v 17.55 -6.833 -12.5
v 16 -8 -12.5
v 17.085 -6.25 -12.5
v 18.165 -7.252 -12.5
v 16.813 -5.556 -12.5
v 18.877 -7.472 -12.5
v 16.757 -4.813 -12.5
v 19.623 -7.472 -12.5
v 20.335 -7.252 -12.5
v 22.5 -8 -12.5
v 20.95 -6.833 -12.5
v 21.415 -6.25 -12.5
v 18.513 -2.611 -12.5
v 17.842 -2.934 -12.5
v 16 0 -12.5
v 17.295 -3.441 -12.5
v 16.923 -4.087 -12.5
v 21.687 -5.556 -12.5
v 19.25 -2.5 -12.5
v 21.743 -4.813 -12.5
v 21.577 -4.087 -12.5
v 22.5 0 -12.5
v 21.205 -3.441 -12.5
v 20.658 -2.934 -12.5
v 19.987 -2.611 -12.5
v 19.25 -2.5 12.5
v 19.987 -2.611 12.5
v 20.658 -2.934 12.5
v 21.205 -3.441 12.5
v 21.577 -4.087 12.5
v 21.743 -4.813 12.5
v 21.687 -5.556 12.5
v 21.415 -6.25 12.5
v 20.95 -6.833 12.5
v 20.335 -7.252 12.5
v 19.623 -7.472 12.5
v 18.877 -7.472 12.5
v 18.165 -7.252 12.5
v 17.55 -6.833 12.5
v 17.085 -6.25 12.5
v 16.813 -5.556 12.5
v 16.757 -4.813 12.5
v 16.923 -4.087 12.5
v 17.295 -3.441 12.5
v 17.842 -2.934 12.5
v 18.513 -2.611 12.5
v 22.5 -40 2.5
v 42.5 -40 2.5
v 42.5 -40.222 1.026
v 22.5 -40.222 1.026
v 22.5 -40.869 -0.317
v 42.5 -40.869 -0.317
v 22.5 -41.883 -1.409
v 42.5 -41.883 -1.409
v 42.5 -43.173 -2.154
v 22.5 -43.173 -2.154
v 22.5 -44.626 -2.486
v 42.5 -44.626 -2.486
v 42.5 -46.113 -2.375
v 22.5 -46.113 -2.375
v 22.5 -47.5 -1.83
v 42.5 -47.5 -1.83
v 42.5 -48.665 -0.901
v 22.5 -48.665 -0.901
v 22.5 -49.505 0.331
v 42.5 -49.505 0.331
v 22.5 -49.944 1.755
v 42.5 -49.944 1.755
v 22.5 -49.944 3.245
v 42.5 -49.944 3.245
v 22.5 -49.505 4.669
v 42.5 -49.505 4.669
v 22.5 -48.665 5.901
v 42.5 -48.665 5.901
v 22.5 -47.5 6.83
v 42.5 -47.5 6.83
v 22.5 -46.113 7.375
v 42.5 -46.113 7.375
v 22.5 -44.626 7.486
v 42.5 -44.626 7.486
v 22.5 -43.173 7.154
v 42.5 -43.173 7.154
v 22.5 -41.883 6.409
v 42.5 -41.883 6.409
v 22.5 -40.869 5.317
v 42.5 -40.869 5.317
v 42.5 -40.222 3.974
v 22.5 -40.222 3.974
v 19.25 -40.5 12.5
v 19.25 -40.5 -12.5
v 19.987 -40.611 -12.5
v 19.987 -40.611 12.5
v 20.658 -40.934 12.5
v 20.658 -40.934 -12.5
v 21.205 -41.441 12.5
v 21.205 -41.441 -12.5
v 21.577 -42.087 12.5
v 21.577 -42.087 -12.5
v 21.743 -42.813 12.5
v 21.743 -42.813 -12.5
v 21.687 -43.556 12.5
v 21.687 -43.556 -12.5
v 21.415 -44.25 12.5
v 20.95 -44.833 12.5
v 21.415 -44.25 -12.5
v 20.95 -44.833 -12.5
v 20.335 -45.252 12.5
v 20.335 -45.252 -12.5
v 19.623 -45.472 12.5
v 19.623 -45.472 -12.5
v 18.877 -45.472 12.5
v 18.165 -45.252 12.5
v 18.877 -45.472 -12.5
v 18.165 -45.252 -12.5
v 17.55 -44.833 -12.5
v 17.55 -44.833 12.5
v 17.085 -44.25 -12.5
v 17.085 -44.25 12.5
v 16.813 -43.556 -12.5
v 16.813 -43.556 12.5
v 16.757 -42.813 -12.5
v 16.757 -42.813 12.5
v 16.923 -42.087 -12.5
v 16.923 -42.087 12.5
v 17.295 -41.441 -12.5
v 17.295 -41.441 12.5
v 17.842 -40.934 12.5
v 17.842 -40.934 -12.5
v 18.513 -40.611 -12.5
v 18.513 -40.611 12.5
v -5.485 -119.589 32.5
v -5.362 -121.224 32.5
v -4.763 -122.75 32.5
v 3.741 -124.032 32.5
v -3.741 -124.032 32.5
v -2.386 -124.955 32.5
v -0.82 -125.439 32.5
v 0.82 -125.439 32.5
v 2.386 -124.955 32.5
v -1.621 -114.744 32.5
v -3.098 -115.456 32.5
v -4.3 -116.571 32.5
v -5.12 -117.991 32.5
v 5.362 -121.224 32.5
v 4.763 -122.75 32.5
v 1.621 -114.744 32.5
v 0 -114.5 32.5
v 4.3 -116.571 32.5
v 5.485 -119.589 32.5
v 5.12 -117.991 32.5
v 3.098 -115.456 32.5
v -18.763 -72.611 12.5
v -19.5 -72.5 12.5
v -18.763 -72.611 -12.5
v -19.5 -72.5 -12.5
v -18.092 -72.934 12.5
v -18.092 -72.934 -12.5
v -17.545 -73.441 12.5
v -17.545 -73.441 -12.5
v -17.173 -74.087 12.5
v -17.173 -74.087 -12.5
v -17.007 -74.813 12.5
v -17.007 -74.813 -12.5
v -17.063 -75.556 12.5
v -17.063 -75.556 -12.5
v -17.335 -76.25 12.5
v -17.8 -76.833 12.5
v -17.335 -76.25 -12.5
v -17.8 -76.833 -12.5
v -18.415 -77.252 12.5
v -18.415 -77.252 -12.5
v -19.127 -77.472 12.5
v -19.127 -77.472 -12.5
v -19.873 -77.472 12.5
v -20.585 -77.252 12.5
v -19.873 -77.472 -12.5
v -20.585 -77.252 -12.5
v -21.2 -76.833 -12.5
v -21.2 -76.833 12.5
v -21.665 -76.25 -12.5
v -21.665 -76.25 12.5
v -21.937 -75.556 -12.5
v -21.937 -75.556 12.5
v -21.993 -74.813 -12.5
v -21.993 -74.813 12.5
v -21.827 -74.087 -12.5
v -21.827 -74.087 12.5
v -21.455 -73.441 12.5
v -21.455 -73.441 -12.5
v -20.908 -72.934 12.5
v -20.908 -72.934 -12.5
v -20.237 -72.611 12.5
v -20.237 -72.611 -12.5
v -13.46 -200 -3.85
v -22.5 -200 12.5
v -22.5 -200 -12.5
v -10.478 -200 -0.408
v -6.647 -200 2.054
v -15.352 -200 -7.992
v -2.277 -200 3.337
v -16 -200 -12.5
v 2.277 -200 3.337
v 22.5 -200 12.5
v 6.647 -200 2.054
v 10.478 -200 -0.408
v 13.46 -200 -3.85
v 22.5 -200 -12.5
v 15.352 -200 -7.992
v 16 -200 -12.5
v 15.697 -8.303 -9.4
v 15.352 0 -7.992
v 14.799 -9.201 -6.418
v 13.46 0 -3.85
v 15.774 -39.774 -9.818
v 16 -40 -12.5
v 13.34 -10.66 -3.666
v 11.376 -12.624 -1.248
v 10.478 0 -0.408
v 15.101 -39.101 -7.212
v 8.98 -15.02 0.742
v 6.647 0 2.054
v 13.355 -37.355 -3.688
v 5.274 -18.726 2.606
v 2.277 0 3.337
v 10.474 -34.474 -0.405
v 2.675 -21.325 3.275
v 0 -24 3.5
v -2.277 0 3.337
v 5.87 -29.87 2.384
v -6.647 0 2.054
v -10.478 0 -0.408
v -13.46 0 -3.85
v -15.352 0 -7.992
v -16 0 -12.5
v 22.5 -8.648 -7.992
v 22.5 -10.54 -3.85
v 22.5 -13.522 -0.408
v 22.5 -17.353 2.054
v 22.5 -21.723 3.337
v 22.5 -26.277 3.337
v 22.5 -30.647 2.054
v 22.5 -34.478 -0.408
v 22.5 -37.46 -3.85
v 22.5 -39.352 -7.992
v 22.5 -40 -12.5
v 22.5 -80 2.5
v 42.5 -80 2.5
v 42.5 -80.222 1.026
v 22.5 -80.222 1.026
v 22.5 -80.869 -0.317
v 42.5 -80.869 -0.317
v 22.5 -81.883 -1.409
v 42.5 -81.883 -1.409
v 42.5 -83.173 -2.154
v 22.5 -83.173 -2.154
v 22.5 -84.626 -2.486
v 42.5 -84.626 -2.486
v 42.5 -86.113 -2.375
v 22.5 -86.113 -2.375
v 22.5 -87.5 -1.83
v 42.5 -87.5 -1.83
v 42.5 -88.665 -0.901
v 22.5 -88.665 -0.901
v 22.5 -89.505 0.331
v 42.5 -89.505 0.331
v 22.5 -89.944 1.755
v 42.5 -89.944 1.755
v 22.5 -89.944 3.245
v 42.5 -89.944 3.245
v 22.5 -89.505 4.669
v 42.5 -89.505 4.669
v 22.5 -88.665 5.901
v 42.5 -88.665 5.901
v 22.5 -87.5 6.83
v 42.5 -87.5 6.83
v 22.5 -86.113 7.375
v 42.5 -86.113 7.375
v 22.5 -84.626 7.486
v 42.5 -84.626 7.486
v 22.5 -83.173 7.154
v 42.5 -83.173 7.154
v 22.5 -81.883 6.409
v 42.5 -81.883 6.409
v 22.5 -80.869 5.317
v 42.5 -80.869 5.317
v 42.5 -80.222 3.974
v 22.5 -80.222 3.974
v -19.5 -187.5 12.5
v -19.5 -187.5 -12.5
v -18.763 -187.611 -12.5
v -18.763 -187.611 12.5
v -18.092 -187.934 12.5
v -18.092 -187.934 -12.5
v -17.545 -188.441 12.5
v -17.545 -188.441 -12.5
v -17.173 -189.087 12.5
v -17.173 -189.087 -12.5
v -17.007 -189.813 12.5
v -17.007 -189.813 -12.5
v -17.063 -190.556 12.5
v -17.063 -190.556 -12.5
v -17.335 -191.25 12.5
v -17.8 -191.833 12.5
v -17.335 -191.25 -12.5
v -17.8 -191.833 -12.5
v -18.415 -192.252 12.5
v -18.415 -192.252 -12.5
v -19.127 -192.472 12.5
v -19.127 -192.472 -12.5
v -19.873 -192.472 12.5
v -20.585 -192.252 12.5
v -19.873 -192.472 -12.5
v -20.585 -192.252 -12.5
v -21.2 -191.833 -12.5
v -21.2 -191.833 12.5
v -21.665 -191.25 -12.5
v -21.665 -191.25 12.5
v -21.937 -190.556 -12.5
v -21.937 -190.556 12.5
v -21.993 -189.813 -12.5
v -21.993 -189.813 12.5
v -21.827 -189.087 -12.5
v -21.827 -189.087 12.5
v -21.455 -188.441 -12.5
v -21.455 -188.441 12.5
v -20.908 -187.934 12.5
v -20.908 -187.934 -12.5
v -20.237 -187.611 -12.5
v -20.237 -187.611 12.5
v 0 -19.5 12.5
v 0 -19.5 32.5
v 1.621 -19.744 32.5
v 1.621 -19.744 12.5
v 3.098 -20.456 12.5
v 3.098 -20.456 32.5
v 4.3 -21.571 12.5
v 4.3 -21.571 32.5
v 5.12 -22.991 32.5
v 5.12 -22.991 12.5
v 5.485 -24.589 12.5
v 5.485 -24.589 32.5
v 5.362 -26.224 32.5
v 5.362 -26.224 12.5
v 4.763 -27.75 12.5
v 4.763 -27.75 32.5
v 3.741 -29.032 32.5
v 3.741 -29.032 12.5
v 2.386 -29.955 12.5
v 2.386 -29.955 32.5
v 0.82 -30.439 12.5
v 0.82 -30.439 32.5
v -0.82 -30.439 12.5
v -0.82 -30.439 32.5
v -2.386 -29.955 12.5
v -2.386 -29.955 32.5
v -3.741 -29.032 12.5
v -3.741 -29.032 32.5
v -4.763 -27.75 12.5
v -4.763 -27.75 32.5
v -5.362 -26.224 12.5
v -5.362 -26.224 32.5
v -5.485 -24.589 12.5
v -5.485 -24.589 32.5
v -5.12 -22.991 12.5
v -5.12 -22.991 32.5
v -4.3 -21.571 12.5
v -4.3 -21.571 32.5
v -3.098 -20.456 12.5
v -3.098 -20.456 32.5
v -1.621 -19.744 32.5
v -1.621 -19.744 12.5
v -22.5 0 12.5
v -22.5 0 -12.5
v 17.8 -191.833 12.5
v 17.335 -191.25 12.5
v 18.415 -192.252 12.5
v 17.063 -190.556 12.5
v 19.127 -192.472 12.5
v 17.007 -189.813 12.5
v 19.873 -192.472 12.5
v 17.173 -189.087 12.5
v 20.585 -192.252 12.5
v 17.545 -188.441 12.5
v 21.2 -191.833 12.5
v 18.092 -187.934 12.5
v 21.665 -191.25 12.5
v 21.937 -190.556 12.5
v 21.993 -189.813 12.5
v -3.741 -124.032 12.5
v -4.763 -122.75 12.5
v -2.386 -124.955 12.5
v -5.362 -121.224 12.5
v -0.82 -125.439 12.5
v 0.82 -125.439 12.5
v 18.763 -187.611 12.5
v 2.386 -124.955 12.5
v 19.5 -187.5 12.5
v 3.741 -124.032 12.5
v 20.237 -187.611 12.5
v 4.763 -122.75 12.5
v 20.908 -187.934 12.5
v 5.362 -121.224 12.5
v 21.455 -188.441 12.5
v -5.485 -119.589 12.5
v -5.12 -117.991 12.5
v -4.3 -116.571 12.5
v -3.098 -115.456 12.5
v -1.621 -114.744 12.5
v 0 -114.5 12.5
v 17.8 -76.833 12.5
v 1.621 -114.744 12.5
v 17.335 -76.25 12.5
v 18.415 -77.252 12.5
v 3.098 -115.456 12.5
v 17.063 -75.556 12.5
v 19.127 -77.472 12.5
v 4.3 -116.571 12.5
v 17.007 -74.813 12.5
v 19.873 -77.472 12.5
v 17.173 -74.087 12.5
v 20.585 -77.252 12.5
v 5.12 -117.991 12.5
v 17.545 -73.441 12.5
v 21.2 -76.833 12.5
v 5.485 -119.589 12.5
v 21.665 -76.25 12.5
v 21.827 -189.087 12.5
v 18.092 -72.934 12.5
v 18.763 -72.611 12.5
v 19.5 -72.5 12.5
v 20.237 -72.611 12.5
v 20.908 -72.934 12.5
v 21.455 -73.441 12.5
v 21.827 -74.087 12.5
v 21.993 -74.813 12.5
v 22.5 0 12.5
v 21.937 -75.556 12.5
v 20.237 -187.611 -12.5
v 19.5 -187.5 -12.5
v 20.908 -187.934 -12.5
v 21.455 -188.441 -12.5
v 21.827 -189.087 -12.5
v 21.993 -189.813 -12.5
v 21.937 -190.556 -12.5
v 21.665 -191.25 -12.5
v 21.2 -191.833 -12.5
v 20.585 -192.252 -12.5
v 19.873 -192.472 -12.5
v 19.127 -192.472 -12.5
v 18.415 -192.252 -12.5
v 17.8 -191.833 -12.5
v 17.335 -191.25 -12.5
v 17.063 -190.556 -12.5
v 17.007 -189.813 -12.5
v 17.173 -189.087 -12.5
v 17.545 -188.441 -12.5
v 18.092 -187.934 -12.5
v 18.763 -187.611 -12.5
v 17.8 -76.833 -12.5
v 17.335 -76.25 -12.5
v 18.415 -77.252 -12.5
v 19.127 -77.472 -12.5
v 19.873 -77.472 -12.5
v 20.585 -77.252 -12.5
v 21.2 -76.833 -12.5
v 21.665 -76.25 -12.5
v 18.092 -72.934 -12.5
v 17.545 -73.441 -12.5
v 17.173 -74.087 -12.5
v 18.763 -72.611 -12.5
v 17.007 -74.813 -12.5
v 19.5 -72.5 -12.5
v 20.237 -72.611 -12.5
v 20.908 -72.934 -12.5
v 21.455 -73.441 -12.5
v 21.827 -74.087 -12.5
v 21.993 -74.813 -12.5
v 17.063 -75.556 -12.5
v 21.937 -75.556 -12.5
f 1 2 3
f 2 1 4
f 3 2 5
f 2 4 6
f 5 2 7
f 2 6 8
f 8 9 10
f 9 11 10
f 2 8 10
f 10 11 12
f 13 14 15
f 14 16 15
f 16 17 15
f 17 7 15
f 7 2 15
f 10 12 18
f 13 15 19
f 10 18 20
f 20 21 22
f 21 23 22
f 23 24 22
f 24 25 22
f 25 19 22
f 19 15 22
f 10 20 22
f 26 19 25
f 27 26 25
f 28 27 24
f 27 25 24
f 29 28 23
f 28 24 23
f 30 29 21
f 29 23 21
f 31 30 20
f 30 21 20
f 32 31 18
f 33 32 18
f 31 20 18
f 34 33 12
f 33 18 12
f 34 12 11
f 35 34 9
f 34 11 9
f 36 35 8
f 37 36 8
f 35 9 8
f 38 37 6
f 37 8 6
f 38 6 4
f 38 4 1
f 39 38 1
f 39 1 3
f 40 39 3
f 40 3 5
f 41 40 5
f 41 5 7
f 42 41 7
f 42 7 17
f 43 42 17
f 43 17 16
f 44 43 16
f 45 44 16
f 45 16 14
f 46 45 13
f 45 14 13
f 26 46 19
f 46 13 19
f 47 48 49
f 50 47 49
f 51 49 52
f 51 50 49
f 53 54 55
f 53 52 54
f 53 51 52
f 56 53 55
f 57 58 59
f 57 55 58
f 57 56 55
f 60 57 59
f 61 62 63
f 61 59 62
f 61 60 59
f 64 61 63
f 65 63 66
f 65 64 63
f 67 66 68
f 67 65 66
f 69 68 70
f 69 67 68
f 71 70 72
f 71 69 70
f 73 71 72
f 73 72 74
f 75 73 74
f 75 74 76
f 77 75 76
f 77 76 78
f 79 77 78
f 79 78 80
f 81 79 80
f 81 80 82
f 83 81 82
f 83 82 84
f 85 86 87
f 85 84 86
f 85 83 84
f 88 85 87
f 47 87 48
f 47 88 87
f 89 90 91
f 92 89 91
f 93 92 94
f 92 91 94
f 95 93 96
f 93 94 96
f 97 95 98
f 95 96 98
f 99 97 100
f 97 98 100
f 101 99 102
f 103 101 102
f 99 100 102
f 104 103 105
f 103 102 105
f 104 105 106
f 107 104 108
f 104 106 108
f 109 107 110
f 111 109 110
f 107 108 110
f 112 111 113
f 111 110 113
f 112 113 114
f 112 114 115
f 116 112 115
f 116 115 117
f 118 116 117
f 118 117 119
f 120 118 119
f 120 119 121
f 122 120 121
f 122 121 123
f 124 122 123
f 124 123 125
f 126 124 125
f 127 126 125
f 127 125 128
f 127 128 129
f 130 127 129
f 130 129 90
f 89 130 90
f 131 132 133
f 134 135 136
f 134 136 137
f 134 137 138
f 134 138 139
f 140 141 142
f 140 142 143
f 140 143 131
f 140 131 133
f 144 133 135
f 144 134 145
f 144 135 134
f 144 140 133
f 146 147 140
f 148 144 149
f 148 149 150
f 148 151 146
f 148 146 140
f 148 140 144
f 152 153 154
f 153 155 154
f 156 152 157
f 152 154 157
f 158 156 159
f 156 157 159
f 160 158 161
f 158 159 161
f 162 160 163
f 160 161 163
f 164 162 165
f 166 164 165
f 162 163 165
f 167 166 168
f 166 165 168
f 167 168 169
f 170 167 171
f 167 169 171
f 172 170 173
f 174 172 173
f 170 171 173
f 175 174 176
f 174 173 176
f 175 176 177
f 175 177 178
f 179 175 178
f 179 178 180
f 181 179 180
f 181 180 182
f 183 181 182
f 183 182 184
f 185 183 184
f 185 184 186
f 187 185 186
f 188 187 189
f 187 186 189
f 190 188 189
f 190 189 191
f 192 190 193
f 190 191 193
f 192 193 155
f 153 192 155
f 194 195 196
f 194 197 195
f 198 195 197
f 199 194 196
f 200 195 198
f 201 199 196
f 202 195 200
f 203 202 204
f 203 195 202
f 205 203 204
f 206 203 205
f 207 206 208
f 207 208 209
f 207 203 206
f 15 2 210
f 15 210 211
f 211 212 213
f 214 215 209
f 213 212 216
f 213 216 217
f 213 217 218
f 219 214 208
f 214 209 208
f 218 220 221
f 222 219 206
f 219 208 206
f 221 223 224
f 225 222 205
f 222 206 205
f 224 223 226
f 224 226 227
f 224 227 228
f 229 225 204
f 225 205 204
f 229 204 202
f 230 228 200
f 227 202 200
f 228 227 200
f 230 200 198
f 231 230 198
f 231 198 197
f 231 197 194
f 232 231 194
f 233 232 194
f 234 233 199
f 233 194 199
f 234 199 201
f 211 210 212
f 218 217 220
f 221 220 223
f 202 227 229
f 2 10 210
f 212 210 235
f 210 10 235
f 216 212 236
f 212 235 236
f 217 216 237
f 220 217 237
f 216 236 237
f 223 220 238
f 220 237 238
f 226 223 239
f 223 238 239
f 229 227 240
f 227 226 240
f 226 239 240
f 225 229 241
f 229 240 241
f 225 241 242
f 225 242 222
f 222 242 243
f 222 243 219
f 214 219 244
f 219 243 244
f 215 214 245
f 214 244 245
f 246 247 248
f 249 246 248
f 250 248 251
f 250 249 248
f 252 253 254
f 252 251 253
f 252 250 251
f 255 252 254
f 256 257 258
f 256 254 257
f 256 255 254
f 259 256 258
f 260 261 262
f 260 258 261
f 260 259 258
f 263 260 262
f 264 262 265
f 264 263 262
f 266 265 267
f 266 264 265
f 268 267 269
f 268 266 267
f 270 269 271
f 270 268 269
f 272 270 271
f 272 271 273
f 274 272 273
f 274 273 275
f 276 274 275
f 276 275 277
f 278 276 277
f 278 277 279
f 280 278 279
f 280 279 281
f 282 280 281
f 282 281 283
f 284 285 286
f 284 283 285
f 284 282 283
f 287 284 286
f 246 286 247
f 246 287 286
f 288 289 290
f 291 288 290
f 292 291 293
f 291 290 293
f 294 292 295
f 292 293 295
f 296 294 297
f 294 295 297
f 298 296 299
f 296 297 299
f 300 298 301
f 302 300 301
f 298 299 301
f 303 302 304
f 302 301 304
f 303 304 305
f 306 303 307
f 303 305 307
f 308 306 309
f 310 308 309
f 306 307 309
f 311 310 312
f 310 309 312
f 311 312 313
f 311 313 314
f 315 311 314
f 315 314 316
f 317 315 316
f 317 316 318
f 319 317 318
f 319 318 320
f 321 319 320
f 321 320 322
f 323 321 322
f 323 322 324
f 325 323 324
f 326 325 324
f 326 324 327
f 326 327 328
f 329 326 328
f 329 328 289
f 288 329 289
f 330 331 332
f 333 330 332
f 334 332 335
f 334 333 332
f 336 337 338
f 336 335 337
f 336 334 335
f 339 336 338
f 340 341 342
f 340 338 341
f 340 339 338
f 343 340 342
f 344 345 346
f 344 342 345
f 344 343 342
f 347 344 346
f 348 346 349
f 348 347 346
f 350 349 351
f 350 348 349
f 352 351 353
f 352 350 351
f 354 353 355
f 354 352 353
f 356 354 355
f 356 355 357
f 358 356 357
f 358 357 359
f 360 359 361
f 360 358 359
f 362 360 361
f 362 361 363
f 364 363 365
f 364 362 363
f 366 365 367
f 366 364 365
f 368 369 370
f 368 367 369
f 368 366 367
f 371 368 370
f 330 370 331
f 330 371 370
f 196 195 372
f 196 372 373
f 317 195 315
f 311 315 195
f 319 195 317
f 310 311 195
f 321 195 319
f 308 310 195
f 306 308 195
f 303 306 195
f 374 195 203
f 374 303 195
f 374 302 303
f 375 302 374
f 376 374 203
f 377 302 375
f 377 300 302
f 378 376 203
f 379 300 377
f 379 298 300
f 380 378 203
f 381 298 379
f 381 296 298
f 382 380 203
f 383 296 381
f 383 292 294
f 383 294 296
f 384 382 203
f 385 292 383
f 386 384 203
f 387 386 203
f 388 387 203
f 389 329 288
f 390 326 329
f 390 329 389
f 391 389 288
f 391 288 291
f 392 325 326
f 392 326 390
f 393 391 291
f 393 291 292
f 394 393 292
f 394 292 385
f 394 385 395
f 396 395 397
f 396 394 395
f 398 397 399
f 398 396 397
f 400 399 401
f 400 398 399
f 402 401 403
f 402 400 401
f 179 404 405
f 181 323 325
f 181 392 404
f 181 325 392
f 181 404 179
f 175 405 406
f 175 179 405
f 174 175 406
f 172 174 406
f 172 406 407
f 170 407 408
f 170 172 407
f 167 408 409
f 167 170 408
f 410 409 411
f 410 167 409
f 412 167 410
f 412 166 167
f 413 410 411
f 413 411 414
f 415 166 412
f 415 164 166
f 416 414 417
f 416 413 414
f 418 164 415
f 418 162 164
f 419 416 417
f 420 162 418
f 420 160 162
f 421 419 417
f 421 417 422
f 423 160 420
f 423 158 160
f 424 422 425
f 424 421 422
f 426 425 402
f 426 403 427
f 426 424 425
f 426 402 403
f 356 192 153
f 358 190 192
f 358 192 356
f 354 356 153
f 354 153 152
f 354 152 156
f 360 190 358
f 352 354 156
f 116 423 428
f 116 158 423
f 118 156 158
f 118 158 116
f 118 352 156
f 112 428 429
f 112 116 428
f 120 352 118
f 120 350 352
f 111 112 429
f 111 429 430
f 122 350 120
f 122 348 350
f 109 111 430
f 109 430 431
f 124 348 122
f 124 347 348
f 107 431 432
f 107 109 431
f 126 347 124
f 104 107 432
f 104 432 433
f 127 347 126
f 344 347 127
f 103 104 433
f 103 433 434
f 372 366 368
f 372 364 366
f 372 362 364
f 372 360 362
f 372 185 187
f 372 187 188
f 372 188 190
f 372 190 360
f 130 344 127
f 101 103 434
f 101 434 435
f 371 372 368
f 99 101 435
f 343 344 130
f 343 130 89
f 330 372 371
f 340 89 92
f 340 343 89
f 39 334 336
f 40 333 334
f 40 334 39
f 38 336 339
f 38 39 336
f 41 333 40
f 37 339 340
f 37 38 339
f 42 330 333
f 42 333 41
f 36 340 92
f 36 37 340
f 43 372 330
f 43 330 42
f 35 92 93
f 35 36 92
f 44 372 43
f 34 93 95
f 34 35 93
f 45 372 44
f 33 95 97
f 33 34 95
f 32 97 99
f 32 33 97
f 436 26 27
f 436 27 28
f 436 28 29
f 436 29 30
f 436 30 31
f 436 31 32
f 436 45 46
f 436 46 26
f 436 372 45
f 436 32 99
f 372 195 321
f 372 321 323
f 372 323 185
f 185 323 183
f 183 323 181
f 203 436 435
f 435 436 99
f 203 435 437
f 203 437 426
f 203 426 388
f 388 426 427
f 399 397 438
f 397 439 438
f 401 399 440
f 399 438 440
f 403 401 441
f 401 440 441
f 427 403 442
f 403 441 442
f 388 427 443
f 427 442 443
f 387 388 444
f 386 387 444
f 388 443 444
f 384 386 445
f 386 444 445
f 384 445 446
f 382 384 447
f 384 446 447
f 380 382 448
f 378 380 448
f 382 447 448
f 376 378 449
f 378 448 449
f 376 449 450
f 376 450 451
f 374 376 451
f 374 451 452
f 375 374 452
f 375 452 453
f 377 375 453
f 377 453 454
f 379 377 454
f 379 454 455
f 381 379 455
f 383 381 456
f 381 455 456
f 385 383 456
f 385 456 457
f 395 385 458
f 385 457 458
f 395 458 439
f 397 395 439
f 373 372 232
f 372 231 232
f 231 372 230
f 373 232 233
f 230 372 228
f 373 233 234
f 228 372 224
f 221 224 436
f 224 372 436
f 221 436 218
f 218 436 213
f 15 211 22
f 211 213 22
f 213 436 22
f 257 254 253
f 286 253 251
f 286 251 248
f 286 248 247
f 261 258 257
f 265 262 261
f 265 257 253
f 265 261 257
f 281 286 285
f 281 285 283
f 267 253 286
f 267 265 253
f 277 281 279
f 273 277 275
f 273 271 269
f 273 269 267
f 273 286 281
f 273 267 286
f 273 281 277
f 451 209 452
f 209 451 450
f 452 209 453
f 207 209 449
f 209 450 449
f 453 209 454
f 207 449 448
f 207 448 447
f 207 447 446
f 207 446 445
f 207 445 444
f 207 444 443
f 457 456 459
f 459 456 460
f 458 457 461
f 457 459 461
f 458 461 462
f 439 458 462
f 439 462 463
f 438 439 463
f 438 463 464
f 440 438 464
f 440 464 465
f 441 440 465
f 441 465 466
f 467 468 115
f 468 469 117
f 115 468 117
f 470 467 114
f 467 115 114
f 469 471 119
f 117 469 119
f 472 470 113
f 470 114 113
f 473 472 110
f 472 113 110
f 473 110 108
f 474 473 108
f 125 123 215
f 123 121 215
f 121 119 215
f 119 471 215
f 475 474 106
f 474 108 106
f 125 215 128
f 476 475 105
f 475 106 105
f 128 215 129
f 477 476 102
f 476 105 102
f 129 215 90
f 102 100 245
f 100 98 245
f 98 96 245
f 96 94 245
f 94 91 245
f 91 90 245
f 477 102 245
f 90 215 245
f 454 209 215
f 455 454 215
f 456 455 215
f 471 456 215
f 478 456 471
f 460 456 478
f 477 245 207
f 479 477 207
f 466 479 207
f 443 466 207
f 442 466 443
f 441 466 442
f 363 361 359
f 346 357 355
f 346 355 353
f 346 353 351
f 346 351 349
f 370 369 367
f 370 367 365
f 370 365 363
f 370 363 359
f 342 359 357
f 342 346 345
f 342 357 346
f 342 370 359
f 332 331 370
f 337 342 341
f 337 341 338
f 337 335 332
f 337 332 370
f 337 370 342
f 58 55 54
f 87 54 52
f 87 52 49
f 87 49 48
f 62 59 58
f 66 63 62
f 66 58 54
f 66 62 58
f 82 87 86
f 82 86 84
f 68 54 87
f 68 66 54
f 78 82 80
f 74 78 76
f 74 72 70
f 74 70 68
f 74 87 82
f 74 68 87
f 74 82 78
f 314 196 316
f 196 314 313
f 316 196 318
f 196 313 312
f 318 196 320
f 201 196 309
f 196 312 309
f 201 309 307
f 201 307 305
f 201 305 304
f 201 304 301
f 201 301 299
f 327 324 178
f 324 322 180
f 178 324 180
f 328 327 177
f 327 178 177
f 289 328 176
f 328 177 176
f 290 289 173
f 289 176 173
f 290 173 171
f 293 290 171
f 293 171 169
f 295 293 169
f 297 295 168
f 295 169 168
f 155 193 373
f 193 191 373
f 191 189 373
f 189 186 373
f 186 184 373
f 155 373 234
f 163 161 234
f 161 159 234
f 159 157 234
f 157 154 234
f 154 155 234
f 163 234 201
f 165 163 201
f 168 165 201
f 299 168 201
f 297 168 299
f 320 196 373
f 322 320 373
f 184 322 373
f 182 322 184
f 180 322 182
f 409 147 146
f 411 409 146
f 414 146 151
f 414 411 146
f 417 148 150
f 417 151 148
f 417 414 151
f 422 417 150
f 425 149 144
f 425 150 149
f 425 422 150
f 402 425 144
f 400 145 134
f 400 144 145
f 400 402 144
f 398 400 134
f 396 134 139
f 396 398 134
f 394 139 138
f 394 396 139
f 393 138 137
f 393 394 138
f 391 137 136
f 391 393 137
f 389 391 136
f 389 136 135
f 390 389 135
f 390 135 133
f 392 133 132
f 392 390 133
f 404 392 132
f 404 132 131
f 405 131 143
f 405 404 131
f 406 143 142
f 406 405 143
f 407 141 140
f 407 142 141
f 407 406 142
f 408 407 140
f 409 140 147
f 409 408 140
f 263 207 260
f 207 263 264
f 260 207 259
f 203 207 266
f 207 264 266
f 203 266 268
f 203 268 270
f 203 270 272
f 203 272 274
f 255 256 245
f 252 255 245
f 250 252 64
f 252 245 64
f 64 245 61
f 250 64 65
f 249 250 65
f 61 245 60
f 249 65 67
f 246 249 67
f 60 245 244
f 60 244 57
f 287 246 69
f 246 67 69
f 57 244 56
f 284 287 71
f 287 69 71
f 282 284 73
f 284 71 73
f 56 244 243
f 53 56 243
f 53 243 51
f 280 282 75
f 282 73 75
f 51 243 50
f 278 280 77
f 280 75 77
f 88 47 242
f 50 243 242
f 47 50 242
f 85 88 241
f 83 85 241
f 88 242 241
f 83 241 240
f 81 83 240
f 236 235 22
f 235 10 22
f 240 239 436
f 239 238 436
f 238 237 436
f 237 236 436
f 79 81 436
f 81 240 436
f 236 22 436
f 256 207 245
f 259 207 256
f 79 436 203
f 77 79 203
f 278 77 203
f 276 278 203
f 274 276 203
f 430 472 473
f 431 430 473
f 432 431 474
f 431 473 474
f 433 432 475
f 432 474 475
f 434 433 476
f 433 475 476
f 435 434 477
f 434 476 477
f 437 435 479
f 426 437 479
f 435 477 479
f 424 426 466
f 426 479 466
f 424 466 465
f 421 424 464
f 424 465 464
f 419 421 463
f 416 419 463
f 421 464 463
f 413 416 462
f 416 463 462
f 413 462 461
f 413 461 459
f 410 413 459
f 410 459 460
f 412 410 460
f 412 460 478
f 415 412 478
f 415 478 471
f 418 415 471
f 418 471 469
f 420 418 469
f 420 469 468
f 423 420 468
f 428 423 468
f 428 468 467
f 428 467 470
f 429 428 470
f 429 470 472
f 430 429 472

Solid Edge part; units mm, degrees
sketch "Sketch1" plane through (0, 0, 0) normal (0, -1, 0) x (1, 0, 0)
  line L0 (-22.5, -12.5) -> (22.5, -12.5)
  line L1 (22.5, -12.5) -> (22.5, 12.5)
  line L2 (-22.5, 12.5) -> (22.5, 12.5)
  line L3 (-22.5, 12.5) -> (-22.5, -12.5)
  dimension "D1" = 25
  dimension "D2" = 45
extrude "Protrusion1" add sketch "Sketch1" along normal blind 200
sketch "Sketch2" plane through (0, -200, 0) normal (0, -1, 0) x (1, 0, 0)
  line L0 (-16, -12.5) -> (16, -12.5)
  arc A0 (-16, -12.5) -> (16, -12.5) centre (0, -12.5) cw
  dimension "D1" = 32
extrude "Cutout1" cut sketch "Sketch2" against normal up to next
hole "Hole_1" at (19.5, -75, -12.5) direction (0, 0, 1) diameter 5 end up to next
hole "Hole1" at (19.5, -190, -12.5) direction (0, 0, 1) diameter 5 end up to next
hole "Hole2" at (-19.5, -190, -12.5) direction (0, 0, 1) diameter 5 end up to next
hole "Hole3" at (-19.5, -75, -12.5) direction (0, 0, 1) diameter 5 end up to next
sketch "Sketch3" plane through (22.5, -75, 0) normal (1, 0, 0) x (0, 1, 0)
  line L0 (67, -12.5) -> (35, -12.5)
  arc A0 (35, -12.5) -> (67, -12.5) centre (51, -12.5) cw
  dimension "D1" = 32
  dimension "D2" = 16
  dimension "D3" = 40
extrude "Cutout2" cut sketch "Sketch3" against normal up to next
hole "Hole_5" at (19.25, -5, -12.5) direction (0, 0, 1) diameter 5 end up to next
hole "Hole4" at (19.25, -43, -12.5) direction (0, 0, 1) diameter 5 end up to next
sketch "Sketch4" plane through (0, -100, 12.5) normal (0, 0, 1) x (0, 1, 0)
  circle A0 centre (-20, 0) radius 5.5
  circle A1 centre (75, 0) radius 5.5
  dimension "D1" = 11
  dimension "D2" = 95
  dimension "D3" = 25
  dimension "D4" = 22.5
extrude "ExtrudedProtrusion_2" add sketch "Sketch4" along normal blind 20
cosmetic_thread "Thread1" size "Tr 11 x 3"
cosmetic_thread "Thread2" size "Tr 11 x 3"
sketch "Sketch5" plane through (22.5, -100, 0) normal (1, 0, 0) x (0, 1, 0)
  circle A0 centre (15, 2.5) radius 5
  circle A1 centre (55, 2.5) radius 5
  dimension "D1" = 40
  dimension "D2" = 10
  dimension "D3" = 10
  dimension "D4" = 10
  dimension "D5" = 45
extrude "ExtrudedProtrusion_3" add sketch "Sketch5" along normal blind 20
cosmetic_thread "Thread3" size "Tr 10 x 2"
cosmetic_thread "Thread4" size "Tr 10 x 2"
